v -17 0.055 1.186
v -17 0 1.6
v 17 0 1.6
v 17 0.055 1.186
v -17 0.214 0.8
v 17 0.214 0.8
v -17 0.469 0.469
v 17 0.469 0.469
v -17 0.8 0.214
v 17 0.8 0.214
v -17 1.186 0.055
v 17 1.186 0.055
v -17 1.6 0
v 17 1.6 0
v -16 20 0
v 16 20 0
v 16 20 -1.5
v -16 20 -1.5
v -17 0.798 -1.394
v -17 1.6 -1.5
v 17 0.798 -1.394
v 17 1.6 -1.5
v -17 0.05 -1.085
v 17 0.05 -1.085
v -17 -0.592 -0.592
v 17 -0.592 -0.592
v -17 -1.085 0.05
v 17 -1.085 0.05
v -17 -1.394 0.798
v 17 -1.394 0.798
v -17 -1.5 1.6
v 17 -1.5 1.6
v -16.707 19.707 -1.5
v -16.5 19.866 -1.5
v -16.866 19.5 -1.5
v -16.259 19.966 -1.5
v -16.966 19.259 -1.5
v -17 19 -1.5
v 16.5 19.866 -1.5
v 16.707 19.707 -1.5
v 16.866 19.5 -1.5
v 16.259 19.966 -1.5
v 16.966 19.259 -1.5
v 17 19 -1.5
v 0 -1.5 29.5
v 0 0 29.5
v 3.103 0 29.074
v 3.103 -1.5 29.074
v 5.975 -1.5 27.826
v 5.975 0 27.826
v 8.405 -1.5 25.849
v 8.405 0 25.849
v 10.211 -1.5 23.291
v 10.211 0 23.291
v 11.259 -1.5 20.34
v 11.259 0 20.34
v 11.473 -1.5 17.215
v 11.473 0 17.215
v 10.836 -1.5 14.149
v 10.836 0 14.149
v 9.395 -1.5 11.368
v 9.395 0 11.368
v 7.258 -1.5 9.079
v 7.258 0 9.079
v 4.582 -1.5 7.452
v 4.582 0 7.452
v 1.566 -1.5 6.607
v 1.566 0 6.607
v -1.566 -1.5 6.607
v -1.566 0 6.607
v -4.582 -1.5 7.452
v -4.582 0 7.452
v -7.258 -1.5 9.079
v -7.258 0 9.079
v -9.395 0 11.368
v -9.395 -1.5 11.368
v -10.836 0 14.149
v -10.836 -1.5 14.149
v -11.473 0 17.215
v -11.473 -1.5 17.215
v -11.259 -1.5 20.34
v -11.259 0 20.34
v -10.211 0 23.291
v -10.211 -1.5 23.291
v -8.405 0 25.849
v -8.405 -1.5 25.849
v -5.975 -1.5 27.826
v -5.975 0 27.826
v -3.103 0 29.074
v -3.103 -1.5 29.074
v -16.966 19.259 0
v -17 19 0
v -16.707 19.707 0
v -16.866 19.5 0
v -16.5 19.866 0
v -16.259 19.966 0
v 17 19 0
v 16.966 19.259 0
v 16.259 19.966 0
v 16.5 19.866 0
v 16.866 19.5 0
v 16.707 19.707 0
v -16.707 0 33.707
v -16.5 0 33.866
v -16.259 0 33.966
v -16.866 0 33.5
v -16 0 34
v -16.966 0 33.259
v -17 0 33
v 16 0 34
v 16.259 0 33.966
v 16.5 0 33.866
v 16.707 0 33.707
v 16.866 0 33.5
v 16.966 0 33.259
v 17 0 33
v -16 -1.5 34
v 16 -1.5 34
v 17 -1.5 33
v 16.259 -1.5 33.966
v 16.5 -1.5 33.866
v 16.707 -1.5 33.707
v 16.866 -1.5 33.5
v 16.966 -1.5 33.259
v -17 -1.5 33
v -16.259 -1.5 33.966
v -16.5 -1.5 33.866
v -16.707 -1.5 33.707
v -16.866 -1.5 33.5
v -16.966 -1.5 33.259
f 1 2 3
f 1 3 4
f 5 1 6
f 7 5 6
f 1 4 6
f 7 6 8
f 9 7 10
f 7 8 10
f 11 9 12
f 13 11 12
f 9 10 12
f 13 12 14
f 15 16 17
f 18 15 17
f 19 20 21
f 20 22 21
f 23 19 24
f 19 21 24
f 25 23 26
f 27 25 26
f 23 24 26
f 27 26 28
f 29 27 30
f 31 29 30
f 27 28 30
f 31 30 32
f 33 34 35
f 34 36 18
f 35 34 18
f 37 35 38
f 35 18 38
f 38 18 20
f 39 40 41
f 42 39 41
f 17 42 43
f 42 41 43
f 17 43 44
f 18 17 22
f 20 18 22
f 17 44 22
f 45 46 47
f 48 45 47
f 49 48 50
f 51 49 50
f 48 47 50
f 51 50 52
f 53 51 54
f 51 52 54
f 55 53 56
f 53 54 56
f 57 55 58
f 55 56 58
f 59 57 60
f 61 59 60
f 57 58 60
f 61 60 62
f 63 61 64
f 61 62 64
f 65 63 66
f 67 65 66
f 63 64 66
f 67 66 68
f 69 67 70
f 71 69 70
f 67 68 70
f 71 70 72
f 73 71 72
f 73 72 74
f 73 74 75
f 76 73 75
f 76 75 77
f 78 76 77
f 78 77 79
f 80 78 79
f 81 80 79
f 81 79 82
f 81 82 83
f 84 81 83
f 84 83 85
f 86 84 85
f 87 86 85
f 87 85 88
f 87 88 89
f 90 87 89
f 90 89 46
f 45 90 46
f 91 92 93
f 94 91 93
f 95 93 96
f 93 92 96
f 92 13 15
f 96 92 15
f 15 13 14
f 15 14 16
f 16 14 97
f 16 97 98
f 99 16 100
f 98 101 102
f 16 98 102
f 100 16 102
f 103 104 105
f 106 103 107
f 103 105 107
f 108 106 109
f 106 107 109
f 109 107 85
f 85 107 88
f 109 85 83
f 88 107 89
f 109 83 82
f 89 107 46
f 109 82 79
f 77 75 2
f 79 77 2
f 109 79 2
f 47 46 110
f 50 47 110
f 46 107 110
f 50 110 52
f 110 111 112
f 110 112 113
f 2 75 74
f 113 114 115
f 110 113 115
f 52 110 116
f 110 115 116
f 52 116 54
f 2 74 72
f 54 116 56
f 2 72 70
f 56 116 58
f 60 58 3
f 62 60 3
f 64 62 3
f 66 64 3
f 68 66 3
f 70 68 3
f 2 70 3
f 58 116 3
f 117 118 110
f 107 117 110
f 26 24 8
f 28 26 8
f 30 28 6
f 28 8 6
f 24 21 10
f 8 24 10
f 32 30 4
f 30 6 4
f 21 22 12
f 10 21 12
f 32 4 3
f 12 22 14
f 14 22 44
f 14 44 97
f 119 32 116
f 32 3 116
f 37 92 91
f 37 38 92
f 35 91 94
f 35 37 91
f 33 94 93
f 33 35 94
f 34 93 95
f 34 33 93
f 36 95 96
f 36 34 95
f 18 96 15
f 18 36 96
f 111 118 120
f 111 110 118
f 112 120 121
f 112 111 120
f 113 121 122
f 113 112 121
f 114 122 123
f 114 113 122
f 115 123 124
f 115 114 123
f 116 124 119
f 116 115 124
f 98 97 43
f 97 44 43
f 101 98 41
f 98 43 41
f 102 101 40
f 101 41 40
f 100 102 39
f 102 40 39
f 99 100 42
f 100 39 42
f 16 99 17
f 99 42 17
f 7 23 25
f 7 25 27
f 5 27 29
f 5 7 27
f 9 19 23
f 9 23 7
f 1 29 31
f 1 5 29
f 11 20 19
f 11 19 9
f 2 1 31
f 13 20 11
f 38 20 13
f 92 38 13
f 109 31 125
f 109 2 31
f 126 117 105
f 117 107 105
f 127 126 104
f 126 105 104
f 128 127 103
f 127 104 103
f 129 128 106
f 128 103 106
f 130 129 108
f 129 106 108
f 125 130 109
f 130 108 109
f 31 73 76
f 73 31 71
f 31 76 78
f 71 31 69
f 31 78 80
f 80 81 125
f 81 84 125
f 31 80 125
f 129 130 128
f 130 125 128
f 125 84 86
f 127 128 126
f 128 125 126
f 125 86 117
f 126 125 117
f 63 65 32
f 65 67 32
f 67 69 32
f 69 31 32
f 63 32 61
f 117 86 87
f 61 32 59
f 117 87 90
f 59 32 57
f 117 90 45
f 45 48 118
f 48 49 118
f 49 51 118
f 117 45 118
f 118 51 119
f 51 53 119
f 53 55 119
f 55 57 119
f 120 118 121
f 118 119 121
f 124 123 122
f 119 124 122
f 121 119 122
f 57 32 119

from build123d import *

# Parameters (mm, degrees)
SM_BASE_FLANGE_1_DEPTH = 17
SKETCH_6_R             = 11.5
CUT_EXTRUDE_1_DEPTH    = 43.95346319
FILLET_1_R             = 1


# Sheet-metal steps are written as plain solids
with BuildPart() as part:
    # Sketch 1 → Базовая кромка1 (new, symmetric)
    with BuildSketch(Plane(origin=(0, 0, 0), x_dir=(0, 0, -1), z_dir=(1, 0, 0))):
        with BuildLine():
            Line((-34, 0), (-1.6, 0))
            ThreePointArc((-1.6, 0), (-0.46862915, 0.46862915), (0, 1.6))
            Line((0, 1.6), (0, 20))
            Line((0, 20), (1.5, 20))
            Line((1.5, 20), (1.5, 1.6))
            ThreePointArc((1.5, 1.6), (0.592031022, -0.592031022), (-1.6, -1.5))
            Line((-1.6, -1.5), (-34, -1.5))
            Line((-34, -1.5), (-34, 0))
        make_face()
    extrude(amount=SM_BASE_FLANGE_1_DEPTH, both=True)

    # Эскиз6 → Вырез-Вытянуть1 (cut, through all)
    with BuildSketch(Plane(origin=(0, 0, 0), x_dir=(1, 0, 0), z_dir=(0, 1, 0))):
        with Locations(Location((0, -18, 0), (0, 0, 270))):
            Circle(SKETCH_6_R)
    extrude(amount=-CUT_EXTRUDE_1_DEPTH, mode=Mode.SUBTRACT)

    # Скругление1
    fillet_1_edges = [part.edges().sort_by_distance(p)[0] for p in [
        (17, -0.75, 34),
        (17, 20, -0.75),
        (-17, -0.75, 34),
        (-17, 20, -0.75),
    ]]
    fillet(fillet_1_edges, radius=FILLET_1_R)


solid = part.part
